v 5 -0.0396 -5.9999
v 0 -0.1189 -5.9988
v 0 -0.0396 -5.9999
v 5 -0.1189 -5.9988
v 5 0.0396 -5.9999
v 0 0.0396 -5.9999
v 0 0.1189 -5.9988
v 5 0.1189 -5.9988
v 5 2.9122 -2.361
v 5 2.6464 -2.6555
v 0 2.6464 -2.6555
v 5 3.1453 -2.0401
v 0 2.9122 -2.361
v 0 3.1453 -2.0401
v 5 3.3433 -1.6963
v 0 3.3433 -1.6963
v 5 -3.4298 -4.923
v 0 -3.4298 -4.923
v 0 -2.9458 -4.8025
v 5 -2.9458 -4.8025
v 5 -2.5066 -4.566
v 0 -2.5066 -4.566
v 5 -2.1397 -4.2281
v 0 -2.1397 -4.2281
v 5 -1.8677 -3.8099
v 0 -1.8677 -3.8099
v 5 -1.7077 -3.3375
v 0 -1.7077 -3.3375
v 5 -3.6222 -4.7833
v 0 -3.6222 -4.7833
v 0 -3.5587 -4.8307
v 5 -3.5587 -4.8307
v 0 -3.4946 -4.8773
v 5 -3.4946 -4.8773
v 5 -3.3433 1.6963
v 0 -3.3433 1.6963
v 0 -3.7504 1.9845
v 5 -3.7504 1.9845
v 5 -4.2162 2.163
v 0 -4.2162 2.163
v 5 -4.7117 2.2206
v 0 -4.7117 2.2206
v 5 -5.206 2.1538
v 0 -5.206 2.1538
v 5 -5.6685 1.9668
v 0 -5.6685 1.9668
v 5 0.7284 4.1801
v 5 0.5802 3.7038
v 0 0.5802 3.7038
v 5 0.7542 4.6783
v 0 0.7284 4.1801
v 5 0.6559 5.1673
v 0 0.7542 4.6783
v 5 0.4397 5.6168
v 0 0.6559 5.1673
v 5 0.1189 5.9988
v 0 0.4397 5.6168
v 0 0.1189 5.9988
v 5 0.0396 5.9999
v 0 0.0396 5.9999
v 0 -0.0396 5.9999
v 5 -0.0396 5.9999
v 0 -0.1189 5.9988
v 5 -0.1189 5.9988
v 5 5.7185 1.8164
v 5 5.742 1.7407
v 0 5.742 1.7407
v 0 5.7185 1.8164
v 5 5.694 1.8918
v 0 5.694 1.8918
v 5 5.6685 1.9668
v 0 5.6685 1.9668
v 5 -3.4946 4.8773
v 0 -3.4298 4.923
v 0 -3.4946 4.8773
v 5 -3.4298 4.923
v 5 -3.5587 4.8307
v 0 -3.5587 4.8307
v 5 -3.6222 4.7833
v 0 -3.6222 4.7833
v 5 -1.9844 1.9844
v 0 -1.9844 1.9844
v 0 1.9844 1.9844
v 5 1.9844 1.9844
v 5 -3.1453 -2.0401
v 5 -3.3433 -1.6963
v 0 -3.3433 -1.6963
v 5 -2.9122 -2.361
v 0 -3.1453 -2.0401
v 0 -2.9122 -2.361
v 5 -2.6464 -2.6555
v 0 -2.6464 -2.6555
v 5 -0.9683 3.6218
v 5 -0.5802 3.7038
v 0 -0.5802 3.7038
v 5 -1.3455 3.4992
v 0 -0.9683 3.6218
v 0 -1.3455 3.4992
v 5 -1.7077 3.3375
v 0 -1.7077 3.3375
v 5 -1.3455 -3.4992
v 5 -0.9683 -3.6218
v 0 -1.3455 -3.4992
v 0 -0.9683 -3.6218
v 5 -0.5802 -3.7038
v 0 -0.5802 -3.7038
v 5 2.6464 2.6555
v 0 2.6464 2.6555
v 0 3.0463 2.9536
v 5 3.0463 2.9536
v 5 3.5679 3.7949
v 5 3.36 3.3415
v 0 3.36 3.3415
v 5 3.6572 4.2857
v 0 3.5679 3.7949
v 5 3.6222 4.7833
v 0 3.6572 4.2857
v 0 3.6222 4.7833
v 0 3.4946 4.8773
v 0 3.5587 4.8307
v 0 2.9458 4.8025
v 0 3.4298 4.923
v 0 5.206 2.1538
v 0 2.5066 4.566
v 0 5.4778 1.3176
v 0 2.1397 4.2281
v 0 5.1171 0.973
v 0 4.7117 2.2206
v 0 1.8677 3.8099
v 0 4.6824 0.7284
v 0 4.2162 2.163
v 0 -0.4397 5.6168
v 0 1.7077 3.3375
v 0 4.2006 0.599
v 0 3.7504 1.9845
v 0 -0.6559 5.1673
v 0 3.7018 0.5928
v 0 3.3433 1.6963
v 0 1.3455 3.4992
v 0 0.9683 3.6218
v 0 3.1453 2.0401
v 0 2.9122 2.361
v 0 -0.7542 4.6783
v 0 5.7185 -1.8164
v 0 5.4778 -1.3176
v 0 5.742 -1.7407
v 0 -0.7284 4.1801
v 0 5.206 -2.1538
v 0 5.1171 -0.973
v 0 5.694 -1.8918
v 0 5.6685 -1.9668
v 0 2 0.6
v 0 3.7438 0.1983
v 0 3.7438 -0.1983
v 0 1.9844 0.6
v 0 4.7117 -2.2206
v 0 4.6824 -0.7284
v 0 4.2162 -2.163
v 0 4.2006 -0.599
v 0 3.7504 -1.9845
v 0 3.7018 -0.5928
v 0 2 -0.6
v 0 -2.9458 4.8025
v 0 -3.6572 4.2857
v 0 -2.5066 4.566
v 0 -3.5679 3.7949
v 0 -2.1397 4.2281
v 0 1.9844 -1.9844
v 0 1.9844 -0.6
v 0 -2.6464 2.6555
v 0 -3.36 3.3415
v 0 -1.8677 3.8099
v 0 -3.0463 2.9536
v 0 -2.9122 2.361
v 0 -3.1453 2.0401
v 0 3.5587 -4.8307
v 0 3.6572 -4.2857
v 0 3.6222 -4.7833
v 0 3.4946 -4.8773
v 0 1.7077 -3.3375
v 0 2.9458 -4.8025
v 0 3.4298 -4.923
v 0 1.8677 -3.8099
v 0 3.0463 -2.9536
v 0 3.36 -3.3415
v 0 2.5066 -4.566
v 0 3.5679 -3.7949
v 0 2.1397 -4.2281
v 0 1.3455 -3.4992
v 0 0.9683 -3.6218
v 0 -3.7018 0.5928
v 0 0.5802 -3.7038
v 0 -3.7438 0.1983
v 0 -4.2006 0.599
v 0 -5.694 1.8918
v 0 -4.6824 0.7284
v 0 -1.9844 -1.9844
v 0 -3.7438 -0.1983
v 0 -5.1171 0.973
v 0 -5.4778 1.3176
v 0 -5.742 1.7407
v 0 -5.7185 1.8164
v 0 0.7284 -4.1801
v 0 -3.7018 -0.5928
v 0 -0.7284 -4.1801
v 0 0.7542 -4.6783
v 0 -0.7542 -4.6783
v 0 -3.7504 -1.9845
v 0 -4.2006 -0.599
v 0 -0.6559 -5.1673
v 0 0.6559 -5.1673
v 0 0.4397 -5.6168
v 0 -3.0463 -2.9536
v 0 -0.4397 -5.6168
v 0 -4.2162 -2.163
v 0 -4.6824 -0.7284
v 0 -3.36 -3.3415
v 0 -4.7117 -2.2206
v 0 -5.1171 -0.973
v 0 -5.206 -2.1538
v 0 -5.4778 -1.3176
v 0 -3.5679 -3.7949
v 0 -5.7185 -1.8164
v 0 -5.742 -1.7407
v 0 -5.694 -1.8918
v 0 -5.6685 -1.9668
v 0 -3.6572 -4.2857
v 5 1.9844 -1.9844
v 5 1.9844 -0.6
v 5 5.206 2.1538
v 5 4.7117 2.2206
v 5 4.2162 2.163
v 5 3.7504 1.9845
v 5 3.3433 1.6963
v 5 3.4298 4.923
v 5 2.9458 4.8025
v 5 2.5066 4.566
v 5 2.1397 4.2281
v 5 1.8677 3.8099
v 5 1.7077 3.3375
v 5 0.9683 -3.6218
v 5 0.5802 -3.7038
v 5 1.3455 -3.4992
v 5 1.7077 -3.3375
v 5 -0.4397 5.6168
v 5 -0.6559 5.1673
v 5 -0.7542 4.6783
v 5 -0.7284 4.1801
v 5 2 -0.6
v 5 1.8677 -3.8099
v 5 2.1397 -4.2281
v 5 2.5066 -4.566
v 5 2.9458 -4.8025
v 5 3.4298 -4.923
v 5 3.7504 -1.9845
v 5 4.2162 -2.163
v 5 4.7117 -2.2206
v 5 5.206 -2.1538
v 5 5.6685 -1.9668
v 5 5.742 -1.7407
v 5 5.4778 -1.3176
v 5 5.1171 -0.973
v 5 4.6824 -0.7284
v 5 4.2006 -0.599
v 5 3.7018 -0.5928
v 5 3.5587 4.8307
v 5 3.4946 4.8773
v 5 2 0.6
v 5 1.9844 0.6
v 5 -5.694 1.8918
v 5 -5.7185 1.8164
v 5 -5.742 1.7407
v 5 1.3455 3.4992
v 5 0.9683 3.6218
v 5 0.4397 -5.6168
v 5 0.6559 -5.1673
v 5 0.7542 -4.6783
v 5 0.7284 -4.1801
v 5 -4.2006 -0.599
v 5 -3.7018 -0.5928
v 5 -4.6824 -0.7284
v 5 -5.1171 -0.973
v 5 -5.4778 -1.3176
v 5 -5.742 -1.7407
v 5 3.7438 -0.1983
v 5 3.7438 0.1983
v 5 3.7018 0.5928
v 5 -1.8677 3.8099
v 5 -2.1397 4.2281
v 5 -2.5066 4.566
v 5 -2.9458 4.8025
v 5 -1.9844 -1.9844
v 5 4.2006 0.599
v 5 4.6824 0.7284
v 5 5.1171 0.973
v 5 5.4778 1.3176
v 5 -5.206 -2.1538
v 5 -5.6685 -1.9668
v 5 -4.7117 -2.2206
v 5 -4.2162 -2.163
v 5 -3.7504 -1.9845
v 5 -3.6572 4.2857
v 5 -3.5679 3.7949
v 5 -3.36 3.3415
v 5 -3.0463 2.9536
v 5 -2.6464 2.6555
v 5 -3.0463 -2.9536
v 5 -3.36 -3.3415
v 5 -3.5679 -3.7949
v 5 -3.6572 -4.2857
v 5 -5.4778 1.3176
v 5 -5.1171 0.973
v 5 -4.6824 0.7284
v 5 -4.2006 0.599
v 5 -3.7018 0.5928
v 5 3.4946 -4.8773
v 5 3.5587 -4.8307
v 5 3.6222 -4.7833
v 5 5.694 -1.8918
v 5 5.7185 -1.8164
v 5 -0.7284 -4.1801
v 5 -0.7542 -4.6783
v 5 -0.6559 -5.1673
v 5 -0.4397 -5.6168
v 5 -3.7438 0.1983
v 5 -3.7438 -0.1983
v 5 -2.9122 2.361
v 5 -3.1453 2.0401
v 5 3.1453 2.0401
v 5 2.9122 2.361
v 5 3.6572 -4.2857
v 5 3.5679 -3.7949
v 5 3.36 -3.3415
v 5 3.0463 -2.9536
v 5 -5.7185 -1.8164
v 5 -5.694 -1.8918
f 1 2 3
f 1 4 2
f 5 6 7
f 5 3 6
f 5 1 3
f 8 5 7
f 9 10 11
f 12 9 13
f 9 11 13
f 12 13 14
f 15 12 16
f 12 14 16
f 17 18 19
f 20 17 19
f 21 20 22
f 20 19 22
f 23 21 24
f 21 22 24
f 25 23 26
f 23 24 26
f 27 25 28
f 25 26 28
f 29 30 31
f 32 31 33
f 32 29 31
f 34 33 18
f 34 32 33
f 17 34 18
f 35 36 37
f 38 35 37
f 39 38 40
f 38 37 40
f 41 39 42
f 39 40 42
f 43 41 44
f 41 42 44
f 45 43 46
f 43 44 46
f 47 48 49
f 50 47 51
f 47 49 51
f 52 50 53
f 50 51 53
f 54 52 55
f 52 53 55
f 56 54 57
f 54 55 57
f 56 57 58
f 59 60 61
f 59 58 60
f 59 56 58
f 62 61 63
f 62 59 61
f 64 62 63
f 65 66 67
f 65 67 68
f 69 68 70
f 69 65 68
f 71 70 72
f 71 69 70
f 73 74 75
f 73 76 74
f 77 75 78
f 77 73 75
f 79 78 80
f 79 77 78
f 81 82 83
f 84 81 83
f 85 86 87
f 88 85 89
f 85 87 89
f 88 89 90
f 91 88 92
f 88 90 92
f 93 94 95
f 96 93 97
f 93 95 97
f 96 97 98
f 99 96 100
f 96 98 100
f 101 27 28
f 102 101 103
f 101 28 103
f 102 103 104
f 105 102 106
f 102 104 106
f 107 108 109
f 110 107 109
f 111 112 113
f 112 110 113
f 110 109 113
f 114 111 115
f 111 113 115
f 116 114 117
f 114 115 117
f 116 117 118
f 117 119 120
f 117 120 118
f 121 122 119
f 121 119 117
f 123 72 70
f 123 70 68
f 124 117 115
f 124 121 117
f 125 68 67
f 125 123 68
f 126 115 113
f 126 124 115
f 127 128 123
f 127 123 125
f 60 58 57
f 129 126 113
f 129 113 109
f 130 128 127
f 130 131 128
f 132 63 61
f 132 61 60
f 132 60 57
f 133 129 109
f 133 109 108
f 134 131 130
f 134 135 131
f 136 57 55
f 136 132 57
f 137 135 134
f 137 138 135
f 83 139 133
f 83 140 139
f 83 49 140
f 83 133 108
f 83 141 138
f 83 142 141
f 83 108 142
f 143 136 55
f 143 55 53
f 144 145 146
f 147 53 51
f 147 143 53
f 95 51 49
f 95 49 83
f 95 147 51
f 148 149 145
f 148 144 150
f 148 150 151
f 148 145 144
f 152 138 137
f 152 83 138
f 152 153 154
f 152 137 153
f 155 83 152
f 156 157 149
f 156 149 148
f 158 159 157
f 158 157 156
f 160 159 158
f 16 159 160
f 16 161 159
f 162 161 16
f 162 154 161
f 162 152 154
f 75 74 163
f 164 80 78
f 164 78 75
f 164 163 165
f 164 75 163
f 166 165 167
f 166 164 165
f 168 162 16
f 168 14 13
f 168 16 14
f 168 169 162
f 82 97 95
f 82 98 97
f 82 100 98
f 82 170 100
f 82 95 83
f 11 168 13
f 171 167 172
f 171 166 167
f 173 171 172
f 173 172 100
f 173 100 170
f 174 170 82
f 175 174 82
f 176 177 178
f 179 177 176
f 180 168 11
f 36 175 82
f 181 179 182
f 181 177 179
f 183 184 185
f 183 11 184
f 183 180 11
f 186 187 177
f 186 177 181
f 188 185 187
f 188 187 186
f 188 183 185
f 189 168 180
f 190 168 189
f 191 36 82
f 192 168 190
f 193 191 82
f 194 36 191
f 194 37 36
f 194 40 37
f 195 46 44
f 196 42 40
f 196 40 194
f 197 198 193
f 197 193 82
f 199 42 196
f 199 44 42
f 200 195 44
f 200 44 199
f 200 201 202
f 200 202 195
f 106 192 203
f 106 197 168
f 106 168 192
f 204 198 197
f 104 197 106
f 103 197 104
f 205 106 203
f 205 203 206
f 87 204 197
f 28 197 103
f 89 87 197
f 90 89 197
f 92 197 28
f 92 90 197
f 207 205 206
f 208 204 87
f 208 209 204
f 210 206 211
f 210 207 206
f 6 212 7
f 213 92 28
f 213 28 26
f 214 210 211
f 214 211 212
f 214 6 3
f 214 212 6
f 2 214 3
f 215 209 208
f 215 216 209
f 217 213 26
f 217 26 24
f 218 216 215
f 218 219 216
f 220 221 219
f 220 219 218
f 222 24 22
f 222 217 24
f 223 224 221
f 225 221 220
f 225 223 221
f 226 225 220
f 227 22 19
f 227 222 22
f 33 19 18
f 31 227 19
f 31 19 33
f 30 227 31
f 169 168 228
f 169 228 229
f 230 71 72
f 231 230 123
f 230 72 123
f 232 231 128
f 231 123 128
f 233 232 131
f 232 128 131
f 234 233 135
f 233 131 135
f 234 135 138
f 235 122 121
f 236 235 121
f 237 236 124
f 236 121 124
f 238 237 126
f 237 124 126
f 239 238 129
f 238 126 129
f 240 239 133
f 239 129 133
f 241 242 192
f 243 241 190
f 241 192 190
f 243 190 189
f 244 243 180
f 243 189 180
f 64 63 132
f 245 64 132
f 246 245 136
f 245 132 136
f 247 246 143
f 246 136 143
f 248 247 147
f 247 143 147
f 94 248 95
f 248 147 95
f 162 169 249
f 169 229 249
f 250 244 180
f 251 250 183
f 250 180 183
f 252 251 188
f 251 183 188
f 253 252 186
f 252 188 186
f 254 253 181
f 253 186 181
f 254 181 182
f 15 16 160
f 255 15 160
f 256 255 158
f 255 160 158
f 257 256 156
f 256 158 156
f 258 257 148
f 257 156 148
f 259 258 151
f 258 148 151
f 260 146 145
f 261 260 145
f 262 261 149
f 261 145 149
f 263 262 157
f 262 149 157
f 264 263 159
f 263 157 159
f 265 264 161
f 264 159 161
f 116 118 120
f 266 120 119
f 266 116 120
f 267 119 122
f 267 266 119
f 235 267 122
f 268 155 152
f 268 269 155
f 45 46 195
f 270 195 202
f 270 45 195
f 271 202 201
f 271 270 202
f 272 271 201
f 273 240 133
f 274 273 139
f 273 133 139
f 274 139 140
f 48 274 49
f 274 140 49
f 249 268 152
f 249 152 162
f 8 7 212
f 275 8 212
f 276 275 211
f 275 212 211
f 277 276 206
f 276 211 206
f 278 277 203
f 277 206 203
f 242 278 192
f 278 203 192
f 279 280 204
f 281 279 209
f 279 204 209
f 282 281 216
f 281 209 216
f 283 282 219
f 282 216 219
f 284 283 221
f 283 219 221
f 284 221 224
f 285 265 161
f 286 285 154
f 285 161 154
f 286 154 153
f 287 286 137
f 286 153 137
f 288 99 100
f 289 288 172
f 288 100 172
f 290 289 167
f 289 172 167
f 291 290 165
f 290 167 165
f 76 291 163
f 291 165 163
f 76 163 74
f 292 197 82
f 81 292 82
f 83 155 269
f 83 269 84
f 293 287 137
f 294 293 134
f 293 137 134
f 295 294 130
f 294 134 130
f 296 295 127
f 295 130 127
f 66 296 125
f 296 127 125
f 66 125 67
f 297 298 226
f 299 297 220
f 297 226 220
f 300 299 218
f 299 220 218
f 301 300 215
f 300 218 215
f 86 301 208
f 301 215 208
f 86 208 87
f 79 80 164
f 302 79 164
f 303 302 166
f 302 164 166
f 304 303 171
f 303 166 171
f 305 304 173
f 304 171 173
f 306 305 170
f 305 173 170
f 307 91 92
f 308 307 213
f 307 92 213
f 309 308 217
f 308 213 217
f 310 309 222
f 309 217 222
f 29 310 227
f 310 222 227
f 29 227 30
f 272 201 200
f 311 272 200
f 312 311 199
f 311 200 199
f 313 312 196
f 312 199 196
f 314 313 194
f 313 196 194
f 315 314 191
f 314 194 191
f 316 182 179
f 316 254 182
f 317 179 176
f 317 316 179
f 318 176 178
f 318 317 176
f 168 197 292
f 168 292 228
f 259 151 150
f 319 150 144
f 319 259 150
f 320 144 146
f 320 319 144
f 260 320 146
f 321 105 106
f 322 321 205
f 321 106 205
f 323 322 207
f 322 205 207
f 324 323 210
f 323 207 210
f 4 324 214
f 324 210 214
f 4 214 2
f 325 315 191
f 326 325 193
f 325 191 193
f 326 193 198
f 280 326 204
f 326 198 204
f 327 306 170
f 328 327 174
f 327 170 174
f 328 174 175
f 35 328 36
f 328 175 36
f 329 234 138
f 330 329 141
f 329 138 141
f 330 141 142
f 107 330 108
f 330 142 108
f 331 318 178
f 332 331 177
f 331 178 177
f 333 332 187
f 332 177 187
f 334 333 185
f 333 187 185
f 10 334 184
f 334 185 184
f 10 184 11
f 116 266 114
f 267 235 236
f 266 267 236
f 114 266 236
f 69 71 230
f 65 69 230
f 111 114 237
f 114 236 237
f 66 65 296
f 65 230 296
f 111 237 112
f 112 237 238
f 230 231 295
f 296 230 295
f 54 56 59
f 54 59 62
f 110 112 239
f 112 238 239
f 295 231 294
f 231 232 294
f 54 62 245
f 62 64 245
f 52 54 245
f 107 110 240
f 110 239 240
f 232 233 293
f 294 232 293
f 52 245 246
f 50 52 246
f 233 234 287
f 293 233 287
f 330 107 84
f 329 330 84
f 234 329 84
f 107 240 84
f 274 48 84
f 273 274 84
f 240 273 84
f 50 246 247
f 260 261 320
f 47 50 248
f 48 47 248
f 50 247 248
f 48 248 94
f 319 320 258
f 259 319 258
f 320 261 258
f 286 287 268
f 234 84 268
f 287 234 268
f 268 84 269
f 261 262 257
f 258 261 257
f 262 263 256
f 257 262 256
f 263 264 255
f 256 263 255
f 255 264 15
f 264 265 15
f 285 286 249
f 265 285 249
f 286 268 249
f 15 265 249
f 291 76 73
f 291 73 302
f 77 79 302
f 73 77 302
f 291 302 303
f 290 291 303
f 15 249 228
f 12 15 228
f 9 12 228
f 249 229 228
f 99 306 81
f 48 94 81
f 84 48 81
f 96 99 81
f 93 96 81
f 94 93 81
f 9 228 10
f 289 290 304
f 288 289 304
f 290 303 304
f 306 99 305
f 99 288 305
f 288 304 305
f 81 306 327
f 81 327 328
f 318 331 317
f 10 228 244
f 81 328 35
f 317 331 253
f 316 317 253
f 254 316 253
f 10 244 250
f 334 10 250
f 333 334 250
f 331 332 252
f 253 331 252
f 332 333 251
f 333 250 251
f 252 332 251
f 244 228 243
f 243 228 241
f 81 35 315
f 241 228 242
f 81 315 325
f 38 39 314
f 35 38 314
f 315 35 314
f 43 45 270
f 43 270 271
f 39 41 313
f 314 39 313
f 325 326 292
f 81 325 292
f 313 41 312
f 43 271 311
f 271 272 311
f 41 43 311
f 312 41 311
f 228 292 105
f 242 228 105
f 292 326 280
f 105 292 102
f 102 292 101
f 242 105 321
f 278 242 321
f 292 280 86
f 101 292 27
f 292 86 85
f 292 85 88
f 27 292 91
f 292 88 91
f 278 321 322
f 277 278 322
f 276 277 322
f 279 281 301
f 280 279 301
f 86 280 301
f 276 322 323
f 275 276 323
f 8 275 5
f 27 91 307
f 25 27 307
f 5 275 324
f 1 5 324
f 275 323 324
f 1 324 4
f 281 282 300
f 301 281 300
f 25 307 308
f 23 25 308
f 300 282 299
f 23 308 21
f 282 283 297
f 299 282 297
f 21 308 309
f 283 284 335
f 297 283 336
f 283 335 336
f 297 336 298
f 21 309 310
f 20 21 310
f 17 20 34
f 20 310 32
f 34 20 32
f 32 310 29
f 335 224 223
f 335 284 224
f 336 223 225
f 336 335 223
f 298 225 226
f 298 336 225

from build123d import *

# Parameters (mm, degrees)
BASPROSKE_W        = 5
BASPROSKE_H        = 6
TOOTHCUT_DEPTH     = 10.848857802
TEETHCUTS_COUNT    = 10
TEETHCUTS_ANGLE    = 324
BORSKE_R           = 1.5
BORE_DEPTH         = 50.0000508
KEYSKE_W           = 1.2
KEYSKE_H           = 2
KEYWAY_DEPTH       = 50.0000508
SKETCH1_W          = 3.96875
SKETCH1_H          = 3.96875
CUT_EXTRUDE1_DEPTH = 10.693816982


with BuildPart() as part:
    # BasProSke → Base-Revolve (revolve)
    with BuildSketch(Plane(origin=(0, 0, 0), x_dir=(1, 0, 0), z_dir=(0, 1, 0)), mode=Mode.PRIVATE) as base_revolve_sk:
        with Locations((2.5, 3)):
            Rectangle(BASPROSKE_W, BASPROSKE_H)
    revolve(base_revolve_sk.sketch.rotate(Axis((-10, 0, 0), (1, 0, 0)), 180), axis=Axis((-10, 0, 0), (1, 0, 0)))

    # TooCutSke → ToothCut (cut, through all)
    with BuildSketch(Plane(origin=(0, 0, 0), x_dir=(0, 0, -1), z_dir=(1, 0, 0))):
        with BuildLine():
            ThreePointArc((0.59278292, 3.701838653), (0, 3.749), (-0.59278292, 3.701838653))
            ThreePointArc((-0.59278292, 3.701838653), (-0.846593509, 4.924114224), (-1.775771316, 5.757784417))
            ThreePointArc((-1.775771316, 5.757784417), (0, 6.0254), (1.775771316, 5.757784417))
            ThreePointArc((1.775771316, 5.757784417), (0.846593509, 4.924114224), (0.59278292, 3.701838653))
        make_face()
    toothcut = extrude(amount=TOOTHCUT_DEPTH, mode=Mode.SUBTRACT)

    # TeethCuts: ToothCut ×10 about axis
    teethcuts_axis = Axis((-10, 0, 0), (1, 0, 0))
    for i in range(1, TEETHCUTS_COUNT):
        add(toothcut.rotate(teethcuts_axis, i * TEETHCUTS_ANGLE / (TEETHCUTS_COUNT - 1)), mode=Mode.SUBTRACT)

    # BorSke → Bore (cut, symmetric)
    with BuildSketch(Plane(origin=(0, 0, 0), x_dir=(0, 0, -1), z_dir=(1, 0, 0))):
        with Locations(Location((0, 0, 0), (0, 0, 180))):
            Circle(BORSKE_R)
    extrude(amount=BORE_DEPTH, both=True, mode=Mode.SUBTRACT)

    # KeySke → Keyway (cut, symmetric)
    with BuildSketch(Plane(origin=(0, 0, 0), x_dir=(0, 0, -1), z_dir=(1, 0, 0))):
        with Locations((0, 1)):
            Rectangle(KEYSKE_W, KEYSKE_H)
    extrude(amount=KEYWAY_DEPTH, both=True, mode=Mode.SUBTRACT)

    # Sketch1 → Cut-Extrude1 (cut, through all)
    with BuildSketch(Plane.ZY):
        Rectangle(SKETCH1_W, SKETCH1_H)
    extrude(amount=-CUT_EXTRUDE1_DEPTH, mode=Mode.SUBTRACT)


solid = part.part
